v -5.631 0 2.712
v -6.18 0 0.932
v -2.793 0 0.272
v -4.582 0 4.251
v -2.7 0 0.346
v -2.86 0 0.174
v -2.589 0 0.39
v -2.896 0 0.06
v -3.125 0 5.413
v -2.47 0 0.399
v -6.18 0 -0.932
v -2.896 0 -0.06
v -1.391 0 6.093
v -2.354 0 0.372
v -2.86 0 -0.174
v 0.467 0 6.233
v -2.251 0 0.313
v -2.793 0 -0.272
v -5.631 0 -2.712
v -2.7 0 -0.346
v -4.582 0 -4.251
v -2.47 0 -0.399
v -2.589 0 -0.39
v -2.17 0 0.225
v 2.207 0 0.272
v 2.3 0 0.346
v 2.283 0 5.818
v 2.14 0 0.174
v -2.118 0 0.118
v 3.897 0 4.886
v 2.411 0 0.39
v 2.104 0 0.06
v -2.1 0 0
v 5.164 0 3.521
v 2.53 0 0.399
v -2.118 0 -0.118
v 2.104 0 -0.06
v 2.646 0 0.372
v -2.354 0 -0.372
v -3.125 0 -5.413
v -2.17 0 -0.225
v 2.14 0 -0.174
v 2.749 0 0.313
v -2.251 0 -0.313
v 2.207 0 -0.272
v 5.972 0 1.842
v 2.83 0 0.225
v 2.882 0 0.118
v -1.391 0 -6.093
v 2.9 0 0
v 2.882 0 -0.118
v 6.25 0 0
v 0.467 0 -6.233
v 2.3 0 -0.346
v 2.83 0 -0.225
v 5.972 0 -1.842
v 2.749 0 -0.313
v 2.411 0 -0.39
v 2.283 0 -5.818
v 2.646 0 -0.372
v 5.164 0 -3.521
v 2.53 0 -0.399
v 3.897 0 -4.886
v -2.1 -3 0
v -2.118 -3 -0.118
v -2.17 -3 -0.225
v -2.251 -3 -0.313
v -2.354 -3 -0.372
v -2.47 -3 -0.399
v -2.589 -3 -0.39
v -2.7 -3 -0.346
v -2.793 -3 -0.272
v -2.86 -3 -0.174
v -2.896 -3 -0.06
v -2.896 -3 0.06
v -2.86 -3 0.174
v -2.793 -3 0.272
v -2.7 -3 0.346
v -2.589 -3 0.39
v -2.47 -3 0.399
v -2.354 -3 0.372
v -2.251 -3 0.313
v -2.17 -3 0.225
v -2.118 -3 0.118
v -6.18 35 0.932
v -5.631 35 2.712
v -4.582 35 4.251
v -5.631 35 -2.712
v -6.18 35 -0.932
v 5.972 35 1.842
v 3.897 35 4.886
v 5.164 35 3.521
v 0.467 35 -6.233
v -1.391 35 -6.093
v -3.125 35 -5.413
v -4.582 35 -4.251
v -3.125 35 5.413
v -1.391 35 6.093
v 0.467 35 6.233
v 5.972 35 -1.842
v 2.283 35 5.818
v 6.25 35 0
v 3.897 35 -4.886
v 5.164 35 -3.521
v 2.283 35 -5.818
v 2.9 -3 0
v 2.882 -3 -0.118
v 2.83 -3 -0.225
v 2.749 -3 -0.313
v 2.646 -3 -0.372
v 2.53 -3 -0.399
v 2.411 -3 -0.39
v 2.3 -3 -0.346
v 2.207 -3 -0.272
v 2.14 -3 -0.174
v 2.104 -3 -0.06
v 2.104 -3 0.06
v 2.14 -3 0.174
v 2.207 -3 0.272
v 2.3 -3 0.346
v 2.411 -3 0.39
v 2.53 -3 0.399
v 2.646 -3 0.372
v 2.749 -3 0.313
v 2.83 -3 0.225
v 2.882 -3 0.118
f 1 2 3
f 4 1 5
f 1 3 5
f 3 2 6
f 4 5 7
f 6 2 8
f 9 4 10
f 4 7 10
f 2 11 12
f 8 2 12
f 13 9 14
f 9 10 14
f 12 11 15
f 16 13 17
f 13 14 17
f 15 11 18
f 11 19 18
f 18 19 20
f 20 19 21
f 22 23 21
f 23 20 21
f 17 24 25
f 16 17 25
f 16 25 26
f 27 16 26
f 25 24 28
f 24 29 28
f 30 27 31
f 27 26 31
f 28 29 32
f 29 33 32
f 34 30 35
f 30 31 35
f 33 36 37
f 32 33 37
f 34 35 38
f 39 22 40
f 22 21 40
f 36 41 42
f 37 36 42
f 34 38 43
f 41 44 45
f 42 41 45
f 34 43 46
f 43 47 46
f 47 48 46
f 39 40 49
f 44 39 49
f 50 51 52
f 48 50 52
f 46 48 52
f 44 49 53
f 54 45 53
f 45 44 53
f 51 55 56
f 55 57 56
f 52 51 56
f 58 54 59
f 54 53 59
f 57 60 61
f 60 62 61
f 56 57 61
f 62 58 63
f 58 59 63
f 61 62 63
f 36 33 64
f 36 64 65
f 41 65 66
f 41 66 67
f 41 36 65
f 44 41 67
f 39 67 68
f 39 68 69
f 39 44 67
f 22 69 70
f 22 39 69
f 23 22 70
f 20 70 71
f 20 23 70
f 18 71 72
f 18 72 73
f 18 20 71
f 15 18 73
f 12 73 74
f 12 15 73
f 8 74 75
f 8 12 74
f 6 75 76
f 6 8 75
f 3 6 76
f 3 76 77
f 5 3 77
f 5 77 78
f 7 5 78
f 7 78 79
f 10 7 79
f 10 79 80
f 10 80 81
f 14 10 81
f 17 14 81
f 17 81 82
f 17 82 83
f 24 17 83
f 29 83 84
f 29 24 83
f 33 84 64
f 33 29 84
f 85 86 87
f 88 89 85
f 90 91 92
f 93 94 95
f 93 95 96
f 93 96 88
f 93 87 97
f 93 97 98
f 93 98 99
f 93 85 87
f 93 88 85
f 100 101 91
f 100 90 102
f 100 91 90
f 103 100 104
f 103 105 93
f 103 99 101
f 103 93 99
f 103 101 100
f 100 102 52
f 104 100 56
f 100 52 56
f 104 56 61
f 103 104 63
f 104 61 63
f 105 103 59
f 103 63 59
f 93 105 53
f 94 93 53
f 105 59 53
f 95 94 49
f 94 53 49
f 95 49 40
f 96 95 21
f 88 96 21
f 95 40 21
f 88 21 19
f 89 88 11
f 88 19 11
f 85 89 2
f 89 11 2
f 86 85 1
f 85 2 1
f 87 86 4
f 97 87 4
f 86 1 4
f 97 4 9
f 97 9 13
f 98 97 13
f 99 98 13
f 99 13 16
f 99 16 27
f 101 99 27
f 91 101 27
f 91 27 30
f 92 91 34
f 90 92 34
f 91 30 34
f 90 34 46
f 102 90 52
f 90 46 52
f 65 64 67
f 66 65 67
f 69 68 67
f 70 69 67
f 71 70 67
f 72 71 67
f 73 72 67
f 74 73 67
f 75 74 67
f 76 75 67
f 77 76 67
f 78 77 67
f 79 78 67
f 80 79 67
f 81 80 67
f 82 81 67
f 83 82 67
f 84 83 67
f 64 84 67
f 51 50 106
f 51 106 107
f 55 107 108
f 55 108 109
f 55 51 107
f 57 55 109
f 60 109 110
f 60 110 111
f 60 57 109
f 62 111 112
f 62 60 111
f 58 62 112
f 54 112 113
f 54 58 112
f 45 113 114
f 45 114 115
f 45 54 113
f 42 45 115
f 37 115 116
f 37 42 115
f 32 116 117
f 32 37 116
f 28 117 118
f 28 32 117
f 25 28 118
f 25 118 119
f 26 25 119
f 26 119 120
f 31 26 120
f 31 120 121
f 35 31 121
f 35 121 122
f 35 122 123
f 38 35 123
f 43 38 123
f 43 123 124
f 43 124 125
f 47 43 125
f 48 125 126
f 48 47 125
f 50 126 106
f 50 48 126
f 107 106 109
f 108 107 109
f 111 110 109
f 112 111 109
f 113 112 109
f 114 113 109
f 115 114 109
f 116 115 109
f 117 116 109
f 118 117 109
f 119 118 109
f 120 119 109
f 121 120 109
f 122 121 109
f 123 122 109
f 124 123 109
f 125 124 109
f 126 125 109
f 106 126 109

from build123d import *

# Parameters (mm, degrees)
SKETCH_1_R      = 0.4
EXTRUDE_2_DEPTH = 3
SKETCH_2_R      = 0.4
EXTRUDE_3_DEPTH = 3
SKETCH_3_R      = 6.25
EXTRUDE_4_DEPTH = 35


with BuildPart() as part:
    # 草图1 → 凸台-拉伸2 (new body)
    with BuildSketch(Plane(origin=(0, 0, 0), x_dir=(1, 0, 0), z_dir=(0, 1, 0))):
        with Locations((-2.5, 0)):
            Circle(SKETCH_1_R)
    extrude(amount=-EXTRUDE_2_DEPTH)



with BuildPart() as body_2:
    # 草图2 → 凸台-拉伸3 (new body)
    with BuildSketch(Plane(origin=(0, 0, 0), x_dir=(1, 0, 0), z_dir=(0, 1, 0))):
        with Locations((2.5, 0)):
            Circle(SKETCH_2_R)
    extrude(amount=-EXTRUDE_3_DEPTH)


with BuildPart() as part_1:
    add(part.part)

    add(body_2.part)  # 凸台-拉伸4 merges body 2
    # 草图3 → 凸台-拉伸4 (add)
    with BuildSketch(Plane(origin=(0, 0, 0), x_dir=(1, 0, 0), z_dir=(0, 1, 0))):
        Circle(SKETCH_3_R)
    extrude(amount=EXTRUDE_4_DEPTH)


solid = part_1.part
